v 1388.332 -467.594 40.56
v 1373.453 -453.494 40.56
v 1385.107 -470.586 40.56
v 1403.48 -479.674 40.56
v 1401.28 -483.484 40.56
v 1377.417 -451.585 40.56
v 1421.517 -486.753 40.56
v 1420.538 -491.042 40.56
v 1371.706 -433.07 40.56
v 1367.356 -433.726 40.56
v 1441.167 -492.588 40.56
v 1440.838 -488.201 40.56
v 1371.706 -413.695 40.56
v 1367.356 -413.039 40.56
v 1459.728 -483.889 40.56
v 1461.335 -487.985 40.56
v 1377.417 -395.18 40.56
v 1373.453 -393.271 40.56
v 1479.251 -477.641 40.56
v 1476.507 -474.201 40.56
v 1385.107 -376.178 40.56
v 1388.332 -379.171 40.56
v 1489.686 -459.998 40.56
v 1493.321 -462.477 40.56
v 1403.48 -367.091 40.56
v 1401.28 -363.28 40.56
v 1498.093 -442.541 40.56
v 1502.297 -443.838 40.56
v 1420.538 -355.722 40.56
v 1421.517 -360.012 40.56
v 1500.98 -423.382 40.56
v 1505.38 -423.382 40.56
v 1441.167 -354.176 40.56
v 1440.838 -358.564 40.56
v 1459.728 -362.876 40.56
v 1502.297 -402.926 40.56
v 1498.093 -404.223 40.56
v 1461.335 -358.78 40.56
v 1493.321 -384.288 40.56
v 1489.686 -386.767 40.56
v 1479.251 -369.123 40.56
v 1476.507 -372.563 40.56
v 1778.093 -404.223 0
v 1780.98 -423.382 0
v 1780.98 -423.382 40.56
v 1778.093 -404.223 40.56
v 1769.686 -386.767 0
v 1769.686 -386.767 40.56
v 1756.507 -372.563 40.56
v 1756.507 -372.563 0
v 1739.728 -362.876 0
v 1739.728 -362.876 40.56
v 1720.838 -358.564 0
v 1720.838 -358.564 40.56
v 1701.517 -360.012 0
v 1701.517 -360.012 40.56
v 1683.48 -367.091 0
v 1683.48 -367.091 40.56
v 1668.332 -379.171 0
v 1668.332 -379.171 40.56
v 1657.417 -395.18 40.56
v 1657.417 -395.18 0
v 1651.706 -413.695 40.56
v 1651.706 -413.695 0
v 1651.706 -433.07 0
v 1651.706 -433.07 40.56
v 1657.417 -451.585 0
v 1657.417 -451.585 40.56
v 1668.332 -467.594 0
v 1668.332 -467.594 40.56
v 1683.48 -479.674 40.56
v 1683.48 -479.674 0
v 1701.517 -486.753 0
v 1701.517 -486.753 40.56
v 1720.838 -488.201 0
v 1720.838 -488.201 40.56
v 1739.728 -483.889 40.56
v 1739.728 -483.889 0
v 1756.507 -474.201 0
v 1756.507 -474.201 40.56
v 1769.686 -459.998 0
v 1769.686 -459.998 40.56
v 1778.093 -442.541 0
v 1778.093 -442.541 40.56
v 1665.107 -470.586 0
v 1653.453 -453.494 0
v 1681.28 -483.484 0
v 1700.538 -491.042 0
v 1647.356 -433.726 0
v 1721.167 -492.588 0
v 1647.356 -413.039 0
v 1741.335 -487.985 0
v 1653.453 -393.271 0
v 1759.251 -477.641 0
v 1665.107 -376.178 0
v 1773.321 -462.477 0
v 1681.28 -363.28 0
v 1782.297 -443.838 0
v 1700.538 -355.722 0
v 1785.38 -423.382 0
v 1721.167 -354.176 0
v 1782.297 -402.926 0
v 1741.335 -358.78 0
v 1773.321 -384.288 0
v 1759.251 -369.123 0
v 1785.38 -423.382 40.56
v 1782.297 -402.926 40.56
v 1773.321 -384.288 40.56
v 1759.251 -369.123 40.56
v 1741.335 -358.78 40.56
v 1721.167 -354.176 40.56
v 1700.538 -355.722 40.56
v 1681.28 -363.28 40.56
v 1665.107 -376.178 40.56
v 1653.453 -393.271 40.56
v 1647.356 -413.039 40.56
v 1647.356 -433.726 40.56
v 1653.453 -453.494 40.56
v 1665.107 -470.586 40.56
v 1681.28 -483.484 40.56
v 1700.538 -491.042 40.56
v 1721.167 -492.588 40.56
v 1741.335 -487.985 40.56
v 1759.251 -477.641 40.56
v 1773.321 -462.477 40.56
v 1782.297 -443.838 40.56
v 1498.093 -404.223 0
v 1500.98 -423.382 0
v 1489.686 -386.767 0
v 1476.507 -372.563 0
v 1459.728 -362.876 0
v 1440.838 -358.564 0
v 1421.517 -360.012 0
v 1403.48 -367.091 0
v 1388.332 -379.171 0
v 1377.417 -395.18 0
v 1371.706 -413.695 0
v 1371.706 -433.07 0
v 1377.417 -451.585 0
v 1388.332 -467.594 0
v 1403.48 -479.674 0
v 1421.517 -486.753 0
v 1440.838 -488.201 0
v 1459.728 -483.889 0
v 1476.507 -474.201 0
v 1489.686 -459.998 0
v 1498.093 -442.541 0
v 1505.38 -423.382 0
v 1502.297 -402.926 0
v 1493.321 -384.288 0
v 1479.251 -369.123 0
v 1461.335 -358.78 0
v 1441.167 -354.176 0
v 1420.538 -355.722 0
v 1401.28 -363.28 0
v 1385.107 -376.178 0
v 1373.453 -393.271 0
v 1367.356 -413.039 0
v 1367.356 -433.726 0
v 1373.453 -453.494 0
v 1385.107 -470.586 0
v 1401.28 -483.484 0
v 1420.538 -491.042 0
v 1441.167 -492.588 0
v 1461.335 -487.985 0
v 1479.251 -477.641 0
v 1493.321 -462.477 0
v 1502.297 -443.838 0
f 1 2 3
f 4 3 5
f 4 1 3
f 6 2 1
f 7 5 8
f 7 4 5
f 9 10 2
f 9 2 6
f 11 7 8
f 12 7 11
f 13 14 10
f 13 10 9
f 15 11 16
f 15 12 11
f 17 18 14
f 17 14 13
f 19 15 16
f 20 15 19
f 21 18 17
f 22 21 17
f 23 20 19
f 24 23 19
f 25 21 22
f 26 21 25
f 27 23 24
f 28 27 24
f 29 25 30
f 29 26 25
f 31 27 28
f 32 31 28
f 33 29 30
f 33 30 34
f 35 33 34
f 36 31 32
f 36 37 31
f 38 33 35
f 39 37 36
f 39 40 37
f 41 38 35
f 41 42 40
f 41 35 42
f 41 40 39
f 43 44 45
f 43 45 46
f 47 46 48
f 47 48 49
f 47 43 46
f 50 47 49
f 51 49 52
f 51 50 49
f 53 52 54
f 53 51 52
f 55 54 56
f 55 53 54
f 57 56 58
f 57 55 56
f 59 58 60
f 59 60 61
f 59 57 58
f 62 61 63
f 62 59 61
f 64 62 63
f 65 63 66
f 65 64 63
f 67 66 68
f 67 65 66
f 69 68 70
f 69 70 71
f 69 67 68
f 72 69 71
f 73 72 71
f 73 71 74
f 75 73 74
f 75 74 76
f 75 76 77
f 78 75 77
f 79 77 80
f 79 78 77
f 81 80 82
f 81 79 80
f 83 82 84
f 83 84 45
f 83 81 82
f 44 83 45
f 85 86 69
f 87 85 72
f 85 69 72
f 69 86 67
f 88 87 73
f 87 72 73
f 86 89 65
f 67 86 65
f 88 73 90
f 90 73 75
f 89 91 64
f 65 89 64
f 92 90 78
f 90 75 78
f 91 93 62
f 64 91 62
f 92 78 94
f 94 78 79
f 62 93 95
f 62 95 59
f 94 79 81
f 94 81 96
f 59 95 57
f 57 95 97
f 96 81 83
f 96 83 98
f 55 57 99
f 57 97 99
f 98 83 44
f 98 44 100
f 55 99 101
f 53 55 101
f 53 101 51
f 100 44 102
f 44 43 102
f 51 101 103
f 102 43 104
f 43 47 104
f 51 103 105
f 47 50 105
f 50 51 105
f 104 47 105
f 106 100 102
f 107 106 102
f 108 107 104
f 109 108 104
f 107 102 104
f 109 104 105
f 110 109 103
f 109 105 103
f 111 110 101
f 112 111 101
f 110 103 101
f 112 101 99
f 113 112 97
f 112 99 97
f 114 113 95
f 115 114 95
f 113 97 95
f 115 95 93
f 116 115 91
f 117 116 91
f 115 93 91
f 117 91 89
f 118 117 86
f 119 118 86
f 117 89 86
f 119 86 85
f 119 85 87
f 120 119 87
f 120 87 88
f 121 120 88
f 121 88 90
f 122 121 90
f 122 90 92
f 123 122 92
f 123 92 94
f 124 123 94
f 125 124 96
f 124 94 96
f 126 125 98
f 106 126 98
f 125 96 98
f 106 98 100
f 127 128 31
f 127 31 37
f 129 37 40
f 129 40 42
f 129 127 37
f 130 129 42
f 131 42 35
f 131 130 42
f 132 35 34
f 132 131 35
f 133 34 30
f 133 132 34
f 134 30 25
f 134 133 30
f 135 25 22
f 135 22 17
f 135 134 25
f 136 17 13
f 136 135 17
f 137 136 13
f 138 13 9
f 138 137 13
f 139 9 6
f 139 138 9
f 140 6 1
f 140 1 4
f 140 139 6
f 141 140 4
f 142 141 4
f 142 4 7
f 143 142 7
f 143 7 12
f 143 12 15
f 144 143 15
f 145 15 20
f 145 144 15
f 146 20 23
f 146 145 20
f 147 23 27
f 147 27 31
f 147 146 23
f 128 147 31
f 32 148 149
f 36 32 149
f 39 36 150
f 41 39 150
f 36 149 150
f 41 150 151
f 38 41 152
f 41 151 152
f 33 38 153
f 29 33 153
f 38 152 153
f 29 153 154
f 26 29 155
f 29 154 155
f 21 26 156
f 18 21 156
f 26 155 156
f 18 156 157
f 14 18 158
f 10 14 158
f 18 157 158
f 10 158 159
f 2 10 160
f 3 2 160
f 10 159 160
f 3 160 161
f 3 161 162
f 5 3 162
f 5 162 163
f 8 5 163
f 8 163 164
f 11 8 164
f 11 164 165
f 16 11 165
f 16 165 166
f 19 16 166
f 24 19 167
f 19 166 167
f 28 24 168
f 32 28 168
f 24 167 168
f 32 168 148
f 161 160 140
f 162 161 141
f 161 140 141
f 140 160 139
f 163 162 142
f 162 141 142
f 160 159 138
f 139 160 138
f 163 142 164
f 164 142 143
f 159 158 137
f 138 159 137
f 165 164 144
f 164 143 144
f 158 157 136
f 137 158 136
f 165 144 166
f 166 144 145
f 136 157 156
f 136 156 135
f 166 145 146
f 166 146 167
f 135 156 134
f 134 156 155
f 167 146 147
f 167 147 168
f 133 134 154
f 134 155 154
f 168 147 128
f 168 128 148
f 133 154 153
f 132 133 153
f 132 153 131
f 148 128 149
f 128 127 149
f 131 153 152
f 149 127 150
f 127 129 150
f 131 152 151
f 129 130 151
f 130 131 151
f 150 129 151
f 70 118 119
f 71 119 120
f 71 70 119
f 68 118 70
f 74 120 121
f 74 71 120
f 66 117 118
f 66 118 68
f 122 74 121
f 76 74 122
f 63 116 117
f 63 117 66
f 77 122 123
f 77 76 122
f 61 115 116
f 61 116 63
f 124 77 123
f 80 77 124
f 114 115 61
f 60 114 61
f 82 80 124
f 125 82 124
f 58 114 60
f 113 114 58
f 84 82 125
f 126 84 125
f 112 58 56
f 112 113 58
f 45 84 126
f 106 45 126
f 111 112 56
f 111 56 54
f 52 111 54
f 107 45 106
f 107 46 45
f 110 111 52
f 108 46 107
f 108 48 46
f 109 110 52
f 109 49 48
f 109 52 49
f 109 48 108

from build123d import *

# Parameters (mm, degrees)
SKETCH1_R             = 69.4
SKETCH1_R_2           = 65
BOSS_EXTRUDE1_DEPTH   = 40.56
BOSS_EXTRUDE1_2_DEPTH = 40.56


with BuildPart() as part:
    # Sketch1 → Boss-Extrude1 (new body)
    with BuildSketch(Plane.XY):
        with Locations((1715.980472759, -423.382336202)):
            Circle(SKETCH1_R)
        with Locations((1715.980472759, -423.382336202)):
            Circle(SKETCH1_R_2, mode=Mode.SUBTRACT)
    extrude(amount=BOSS_EXTRUDE1_DEPTH)


with BuildPart() as body_2:
    # Sketch1 → Boss-Extrude1 2 (new body)
    with BuildSketch(Plane.XY):
        with Locations((1435.980472759, -423.382336202)):
            Circle(SKETCH1_R)
        with Locations((1435.980472759, -423.382336202)):
            Circle(SKETCH1_R_2, mode=Mode.SUBTRACT)
    extrude(amount=BOSS_EXTRUDE1_2_DEPTH)


solid = Compound([part.part, body_2.part])
